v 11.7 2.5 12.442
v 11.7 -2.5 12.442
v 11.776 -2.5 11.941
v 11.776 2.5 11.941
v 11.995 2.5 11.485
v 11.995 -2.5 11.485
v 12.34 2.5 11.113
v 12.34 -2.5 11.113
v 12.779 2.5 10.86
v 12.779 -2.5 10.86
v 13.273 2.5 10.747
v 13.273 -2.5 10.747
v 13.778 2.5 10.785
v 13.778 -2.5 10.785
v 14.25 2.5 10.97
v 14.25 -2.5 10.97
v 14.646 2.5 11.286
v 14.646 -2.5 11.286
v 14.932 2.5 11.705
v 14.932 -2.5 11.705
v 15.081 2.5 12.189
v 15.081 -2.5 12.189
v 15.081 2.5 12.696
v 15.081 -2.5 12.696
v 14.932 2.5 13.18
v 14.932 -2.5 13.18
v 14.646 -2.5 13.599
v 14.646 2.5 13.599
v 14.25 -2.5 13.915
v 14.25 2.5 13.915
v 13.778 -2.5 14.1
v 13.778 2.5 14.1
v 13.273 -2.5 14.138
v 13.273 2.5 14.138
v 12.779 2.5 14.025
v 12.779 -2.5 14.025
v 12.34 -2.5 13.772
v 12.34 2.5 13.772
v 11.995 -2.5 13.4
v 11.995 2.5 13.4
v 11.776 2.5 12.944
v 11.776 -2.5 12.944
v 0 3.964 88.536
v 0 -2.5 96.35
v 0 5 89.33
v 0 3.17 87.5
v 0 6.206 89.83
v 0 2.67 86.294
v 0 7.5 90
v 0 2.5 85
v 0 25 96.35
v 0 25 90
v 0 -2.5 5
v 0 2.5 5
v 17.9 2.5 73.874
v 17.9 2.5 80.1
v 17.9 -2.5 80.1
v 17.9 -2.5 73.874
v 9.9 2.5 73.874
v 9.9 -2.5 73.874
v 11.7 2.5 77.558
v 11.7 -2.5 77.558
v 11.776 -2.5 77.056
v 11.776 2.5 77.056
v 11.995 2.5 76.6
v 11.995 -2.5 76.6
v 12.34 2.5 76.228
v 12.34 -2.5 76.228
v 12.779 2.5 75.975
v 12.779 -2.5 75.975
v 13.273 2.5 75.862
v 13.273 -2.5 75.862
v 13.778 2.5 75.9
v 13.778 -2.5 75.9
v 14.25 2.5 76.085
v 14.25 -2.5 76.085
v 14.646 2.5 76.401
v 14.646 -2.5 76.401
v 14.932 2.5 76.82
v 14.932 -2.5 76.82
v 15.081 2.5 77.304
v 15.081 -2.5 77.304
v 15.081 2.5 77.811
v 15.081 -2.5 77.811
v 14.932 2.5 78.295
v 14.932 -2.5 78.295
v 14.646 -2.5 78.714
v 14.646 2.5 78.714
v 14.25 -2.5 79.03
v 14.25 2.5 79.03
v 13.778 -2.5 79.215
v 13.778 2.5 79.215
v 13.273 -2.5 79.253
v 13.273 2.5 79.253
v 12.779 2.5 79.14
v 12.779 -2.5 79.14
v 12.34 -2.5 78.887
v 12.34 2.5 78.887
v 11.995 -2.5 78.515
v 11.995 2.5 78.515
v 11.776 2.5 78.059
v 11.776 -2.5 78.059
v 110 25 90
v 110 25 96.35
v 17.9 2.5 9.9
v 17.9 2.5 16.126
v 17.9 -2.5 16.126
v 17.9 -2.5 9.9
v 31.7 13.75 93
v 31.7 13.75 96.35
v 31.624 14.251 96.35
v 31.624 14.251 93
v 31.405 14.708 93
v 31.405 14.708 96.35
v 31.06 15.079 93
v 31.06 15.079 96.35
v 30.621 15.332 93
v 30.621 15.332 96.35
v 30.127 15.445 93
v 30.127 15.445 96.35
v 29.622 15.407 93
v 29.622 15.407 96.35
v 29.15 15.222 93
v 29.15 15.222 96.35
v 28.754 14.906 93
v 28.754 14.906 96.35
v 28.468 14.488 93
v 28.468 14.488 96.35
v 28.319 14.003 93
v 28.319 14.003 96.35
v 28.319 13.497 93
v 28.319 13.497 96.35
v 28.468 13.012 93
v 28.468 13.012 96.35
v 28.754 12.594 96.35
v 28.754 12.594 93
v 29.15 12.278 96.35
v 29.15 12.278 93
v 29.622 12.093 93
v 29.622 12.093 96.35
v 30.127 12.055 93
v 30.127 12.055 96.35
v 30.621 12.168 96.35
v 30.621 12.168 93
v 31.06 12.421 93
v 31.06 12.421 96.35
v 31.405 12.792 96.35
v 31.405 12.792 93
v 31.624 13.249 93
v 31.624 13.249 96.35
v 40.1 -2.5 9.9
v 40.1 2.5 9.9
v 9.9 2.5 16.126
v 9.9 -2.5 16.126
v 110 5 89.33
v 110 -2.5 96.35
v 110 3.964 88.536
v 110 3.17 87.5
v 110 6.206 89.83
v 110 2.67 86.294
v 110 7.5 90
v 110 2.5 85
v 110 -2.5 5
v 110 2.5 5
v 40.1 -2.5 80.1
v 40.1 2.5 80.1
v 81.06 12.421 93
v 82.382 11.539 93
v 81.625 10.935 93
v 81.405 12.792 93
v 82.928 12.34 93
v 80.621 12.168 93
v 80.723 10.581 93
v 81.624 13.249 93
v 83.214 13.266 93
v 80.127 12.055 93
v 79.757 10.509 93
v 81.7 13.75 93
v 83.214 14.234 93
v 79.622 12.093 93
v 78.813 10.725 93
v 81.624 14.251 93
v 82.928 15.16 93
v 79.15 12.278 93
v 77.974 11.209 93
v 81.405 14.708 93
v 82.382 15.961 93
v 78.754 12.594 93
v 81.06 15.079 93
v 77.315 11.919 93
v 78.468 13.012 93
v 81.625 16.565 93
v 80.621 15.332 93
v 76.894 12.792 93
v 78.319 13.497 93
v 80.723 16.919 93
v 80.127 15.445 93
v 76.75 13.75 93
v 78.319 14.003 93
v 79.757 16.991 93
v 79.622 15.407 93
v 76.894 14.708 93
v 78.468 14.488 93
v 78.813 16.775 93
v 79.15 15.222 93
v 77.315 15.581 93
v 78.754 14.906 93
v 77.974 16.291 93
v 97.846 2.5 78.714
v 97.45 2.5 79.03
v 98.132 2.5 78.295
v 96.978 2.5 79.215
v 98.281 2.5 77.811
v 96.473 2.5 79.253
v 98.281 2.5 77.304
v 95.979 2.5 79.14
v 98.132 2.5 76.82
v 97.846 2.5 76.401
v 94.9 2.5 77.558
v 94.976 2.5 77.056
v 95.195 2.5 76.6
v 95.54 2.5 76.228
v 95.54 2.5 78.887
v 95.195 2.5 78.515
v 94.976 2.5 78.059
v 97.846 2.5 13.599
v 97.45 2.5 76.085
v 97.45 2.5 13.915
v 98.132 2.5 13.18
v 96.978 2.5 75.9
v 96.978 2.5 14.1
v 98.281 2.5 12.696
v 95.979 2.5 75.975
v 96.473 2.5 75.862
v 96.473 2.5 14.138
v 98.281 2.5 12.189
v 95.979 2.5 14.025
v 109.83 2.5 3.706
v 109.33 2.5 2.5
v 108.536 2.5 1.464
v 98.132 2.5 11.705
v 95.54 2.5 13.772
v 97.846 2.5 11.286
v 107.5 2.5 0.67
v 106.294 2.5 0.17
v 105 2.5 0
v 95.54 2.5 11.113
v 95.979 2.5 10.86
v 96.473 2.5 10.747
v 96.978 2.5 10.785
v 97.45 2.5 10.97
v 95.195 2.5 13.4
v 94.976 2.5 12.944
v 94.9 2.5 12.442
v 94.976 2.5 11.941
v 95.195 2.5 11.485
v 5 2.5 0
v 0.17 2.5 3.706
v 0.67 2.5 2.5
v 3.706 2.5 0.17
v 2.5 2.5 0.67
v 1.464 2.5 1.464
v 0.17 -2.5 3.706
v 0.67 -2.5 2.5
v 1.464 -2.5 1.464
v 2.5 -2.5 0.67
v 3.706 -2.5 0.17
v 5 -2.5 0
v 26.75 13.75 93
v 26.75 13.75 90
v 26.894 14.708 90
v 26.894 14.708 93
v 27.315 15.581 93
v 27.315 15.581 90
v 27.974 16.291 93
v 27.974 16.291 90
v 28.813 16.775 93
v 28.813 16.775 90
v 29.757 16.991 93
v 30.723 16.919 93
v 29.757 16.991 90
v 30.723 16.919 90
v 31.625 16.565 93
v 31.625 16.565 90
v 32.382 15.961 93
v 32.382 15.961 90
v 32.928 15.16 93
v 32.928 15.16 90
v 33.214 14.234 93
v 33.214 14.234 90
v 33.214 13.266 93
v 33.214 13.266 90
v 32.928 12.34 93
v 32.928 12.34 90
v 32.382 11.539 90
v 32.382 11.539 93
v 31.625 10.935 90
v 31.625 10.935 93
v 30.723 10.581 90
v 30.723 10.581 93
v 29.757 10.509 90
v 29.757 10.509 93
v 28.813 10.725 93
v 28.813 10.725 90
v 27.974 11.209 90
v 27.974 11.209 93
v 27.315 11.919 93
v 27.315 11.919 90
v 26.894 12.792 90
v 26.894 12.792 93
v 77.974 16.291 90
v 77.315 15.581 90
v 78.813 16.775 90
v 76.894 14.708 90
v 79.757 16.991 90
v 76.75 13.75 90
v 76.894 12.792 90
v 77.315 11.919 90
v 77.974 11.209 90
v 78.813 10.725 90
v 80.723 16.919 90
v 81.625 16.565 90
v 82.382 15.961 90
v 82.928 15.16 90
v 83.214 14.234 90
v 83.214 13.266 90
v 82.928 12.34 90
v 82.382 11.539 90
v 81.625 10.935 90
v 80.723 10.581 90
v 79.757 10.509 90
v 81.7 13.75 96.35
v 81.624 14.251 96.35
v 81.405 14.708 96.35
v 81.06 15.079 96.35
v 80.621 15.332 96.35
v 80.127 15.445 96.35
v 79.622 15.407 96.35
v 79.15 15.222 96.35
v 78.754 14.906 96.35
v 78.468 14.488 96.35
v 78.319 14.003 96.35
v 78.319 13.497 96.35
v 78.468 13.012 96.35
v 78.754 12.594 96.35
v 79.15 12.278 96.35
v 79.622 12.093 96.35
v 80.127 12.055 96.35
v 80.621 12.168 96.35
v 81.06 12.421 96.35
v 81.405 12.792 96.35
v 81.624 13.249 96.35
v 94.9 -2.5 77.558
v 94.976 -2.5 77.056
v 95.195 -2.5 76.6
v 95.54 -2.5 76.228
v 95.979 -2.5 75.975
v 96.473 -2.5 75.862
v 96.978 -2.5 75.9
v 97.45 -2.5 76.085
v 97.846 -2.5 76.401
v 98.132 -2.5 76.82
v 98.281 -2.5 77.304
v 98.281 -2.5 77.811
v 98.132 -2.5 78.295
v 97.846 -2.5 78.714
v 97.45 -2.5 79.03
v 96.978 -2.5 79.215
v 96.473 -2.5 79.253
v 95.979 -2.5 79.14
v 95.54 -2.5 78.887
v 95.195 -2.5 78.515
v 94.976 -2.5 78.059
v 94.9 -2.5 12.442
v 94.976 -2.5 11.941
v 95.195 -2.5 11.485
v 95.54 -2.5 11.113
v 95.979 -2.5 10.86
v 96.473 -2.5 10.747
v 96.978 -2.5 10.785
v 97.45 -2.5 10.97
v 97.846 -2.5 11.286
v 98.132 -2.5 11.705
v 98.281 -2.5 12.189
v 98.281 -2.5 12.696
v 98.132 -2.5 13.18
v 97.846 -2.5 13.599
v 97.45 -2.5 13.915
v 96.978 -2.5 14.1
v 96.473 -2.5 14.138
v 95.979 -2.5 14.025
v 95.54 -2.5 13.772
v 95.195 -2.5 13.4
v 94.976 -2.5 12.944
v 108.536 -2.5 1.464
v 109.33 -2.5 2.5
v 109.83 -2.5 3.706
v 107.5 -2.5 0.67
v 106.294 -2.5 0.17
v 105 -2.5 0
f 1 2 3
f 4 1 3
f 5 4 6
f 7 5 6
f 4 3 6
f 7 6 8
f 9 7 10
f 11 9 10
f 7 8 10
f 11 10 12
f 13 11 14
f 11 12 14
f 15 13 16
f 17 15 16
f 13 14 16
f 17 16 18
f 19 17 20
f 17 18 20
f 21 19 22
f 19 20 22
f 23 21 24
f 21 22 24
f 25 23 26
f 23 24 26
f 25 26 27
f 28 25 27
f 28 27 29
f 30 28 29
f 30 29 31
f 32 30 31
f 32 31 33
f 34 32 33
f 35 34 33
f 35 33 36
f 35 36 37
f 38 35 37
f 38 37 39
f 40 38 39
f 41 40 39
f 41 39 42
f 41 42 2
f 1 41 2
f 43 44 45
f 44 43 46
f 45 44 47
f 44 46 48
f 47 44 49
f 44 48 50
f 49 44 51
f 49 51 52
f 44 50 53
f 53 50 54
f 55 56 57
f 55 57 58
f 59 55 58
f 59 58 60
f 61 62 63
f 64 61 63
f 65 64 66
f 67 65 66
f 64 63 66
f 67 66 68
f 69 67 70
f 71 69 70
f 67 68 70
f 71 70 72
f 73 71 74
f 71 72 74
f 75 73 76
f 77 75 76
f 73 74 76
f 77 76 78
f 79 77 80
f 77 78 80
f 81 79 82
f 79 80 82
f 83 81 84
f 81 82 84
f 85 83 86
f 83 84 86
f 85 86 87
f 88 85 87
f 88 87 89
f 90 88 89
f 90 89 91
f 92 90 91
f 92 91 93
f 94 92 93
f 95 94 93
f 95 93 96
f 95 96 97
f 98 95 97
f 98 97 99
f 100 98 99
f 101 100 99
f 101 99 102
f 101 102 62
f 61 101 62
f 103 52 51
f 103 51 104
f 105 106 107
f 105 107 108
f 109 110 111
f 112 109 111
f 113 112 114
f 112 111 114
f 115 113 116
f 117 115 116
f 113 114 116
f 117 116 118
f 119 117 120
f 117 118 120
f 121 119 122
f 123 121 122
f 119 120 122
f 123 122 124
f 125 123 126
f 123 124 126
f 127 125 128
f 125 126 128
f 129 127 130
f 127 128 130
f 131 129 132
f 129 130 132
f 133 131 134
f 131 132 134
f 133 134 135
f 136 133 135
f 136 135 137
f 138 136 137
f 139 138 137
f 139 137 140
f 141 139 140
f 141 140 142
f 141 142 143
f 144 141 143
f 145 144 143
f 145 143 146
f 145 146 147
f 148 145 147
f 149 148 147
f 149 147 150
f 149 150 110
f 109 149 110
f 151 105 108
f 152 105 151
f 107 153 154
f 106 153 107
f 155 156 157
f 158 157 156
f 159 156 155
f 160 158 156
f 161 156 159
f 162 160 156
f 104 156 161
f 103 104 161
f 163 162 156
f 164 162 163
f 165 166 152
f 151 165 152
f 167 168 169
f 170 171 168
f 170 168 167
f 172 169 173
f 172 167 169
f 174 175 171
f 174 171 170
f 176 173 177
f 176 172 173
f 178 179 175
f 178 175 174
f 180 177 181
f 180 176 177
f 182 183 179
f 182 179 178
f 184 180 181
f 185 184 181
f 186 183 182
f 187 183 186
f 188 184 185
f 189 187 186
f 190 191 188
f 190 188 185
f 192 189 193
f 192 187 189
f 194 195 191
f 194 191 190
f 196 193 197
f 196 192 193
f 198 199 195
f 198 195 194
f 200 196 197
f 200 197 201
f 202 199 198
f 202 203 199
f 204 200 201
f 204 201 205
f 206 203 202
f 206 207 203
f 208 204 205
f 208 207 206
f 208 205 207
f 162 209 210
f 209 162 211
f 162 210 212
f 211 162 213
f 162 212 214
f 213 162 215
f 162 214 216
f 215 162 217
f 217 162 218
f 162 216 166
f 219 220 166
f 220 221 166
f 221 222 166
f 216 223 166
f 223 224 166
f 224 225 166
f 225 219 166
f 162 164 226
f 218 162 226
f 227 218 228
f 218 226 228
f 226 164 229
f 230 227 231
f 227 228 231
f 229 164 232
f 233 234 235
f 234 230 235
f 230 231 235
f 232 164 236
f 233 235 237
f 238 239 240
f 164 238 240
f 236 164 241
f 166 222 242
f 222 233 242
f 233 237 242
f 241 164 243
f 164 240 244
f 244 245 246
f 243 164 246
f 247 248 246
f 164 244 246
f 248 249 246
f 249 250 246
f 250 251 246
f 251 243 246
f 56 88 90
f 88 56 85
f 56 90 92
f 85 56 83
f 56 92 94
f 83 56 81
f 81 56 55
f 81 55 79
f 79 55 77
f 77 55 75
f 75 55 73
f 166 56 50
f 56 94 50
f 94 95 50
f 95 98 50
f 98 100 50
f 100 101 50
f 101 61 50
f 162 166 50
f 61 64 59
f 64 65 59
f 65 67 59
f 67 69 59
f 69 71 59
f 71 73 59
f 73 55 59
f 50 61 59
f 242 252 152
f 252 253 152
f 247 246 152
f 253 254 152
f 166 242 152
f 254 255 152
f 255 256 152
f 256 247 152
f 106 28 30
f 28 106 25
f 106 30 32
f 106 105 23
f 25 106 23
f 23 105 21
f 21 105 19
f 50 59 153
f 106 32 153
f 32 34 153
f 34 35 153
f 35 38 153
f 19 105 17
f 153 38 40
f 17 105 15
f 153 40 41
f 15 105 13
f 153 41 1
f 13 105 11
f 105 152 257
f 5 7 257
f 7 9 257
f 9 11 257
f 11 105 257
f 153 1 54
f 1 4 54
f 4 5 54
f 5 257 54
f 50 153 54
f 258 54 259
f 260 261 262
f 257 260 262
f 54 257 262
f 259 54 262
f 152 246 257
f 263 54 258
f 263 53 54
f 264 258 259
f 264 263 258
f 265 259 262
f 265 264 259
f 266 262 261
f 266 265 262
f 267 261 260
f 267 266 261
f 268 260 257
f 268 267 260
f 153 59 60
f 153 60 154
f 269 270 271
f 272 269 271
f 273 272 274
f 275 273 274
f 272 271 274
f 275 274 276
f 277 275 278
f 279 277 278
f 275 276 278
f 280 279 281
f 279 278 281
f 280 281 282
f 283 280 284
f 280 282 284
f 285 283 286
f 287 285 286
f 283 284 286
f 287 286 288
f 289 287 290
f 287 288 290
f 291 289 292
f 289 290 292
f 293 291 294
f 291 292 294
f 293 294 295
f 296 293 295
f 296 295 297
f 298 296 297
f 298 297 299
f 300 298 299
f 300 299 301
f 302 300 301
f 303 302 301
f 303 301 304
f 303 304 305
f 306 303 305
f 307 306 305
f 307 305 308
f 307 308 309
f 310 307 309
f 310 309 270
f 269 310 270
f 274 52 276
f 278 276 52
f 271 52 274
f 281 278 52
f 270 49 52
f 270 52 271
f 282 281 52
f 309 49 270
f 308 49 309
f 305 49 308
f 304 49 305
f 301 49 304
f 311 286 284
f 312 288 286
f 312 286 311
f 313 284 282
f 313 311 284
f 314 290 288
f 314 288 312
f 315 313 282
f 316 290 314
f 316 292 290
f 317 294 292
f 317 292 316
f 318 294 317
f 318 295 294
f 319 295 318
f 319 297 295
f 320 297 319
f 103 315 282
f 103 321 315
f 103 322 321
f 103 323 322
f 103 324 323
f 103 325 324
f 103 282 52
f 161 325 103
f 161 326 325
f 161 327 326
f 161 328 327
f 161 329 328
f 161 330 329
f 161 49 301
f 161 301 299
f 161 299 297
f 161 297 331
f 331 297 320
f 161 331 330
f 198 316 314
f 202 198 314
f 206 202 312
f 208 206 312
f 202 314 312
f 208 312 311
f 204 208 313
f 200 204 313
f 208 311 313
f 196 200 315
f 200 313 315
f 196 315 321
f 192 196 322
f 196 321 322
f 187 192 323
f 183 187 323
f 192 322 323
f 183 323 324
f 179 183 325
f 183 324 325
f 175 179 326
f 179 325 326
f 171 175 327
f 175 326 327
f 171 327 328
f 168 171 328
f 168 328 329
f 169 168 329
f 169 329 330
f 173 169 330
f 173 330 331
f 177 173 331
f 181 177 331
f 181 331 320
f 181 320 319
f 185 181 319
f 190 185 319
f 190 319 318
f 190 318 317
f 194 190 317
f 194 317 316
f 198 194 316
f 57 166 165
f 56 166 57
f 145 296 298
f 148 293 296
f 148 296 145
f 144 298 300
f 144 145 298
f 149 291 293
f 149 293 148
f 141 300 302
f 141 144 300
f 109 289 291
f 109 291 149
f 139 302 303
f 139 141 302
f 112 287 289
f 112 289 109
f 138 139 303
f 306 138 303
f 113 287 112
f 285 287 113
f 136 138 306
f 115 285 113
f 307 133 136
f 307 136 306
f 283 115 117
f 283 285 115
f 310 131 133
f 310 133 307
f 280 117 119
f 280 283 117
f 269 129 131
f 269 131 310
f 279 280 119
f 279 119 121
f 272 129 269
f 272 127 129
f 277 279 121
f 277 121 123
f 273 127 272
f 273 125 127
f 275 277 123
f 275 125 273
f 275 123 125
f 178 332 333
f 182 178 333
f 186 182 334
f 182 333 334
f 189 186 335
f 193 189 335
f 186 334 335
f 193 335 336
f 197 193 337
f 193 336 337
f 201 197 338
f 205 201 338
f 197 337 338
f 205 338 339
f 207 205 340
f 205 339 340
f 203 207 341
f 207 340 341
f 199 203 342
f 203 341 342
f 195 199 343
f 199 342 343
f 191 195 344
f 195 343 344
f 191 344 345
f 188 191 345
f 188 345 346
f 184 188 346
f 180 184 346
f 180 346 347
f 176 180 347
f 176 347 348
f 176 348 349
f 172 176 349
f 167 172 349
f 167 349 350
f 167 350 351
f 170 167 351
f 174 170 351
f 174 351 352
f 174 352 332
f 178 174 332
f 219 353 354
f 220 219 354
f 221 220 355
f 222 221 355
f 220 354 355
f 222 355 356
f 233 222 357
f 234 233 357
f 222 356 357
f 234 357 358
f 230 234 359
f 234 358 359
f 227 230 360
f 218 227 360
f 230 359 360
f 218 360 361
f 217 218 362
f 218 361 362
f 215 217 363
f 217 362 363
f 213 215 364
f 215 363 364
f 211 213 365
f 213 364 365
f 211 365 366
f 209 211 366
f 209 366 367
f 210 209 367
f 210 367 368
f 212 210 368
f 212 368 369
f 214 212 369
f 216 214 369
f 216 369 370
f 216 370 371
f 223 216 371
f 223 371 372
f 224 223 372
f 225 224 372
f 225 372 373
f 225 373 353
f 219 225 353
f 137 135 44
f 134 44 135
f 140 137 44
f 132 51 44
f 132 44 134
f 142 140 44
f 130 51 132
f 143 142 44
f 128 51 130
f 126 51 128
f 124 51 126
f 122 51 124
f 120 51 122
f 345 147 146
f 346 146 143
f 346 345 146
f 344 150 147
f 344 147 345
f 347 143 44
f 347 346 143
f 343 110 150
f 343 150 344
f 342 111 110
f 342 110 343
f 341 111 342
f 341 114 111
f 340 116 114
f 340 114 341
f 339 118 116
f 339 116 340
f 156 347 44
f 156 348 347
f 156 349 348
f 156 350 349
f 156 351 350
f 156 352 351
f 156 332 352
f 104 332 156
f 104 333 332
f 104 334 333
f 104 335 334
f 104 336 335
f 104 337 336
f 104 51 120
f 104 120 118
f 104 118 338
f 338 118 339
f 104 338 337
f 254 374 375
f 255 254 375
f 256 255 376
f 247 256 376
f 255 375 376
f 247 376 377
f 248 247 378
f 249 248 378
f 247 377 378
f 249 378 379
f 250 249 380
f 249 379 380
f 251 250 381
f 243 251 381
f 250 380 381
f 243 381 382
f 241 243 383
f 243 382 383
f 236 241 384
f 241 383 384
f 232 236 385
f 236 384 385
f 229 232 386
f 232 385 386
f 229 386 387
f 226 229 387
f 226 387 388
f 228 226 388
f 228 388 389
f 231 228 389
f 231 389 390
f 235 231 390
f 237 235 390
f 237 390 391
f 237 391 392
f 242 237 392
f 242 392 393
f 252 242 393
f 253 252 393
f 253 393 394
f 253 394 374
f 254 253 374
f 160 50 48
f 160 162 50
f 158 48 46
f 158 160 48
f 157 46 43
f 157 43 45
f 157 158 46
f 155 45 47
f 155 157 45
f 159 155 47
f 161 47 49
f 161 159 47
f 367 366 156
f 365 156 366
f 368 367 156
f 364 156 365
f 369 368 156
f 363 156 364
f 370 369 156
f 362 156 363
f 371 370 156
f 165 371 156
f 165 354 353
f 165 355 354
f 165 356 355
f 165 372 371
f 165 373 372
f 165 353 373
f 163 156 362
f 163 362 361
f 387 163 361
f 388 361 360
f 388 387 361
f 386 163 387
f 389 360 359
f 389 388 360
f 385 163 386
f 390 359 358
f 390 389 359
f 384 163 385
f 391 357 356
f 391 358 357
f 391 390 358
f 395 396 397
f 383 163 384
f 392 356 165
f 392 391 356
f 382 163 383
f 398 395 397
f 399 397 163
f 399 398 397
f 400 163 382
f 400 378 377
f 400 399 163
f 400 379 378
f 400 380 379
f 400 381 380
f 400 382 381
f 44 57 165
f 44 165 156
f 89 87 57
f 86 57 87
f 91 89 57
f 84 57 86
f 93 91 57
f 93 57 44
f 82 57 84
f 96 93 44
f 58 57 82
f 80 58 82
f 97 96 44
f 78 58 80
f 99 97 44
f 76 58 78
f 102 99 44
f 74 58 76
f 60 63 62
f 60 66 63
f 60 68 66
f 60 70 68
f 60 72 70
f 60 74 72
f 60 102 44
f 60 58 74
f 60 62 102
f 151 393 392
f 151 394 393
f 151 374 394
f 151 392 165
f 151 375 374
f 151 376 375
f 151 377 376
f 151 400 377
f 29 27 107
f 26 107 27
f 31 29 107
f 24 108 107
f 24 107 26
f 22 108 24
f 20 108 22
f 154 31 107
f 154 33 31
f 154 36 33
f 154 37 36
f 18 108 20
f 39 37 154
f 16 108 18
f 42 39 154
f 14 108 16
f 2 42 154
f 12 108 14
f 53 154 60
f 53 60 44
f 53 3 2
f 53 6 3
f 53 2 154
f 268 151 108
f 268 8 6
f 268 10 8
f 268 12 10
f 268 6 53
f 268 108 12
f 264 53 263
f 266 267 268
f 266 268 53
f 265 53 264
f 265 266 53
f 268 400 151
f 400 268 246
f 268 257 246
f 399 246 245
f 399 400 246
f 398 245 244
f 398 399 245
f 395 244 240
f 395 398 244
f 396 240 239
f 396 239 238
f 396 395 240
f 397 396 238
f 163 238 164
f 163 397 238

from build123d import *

# Parameters (mm, degrees)
SKETCH1_W                      = 110
SKETCH1_H                      = 90
BOSS_EXTRUDE1_DEPTH            = 2.5
M3_CLEARANCE_HOLE1_D           = 3.4
M3_CLEARANCE_HOLE1_DEPTH       = 5
SKETCH5_W                      = 110
SKETCH5_H                      = 6.35
BOSS_EXTRUDE2_DEPTH            = 25
BOSS_EXTRUDE2_DEPTH_BACK       = 2.5
CBORE_FOR_M3_SHCS1_D           = 3.4
CBORE_FOR_M3_SHCS1_DEPTH       = 6.35
CBORE_FOR_M3_SHCS1_CBORE_D     = 6.5
CBORE_FOR_M3_SHCS1_CBORE_DEPTH = 3
CUT_EXTRUDE1_DEPTH             = 6
BOSS_EXTRUDE4_DEPTH            = 5
FILLET1_R                      = 5
FILLET2_R                      = 5


with BuildPart() as part:
    # Sketch1 → Boss-Extrude1 (new body, symmetric)
    with BuildSketch(Plane(origin=(0, 0, 0), x_dir=(1, 0, 0), z_dir=(0, 1, 0))):
        with Locations((55, -45)):
            Rectangle(SKETCH1_W, SKETCH1_H)
    extrude(amount=BOSS_EXTRUDE1_DEPTH, both=True)

    # M3 Clearance Hole1
    with Locations(Plane(origin=(0, 2.5, 0), x_dir=(1, 0, 0), z_dir=(0, 1, 0))):
        with Locations((13.4, -77.55755), (96.6, -12.44245), (96.6, -77.55755), (13.4, -12.44245)):
            Hole(M3_CLEARANCE_HOLE1_D / 2, depth=M3_CLEARANCE_HOLE1_DEPTH)

    # Sketch5 → Boss-Extrude2 (add, two sides)
    with BuildSketch(Plane(origin=(0, 0, 0), x_dir=(1, 0, 0), z_dir=(0, 1, 0))) as boss_extrude2_sk:
        with Locations((55, -93.175)):
            Rectangle(SKETCH5_W, SKETCH5_H)
    extrude(amount=BOSS_EXTRUDE2_DEPTH)
    extrude(boss_extrude2_sk.sketch, amount=-BOSS_EXTRUDE2_DEPTH_BACK)

    # CBORE for M3 SHCS1
    with Locations(Plane(origin=(0, 0, 90), x_dir=(-1, 0, 0), z_dir=(0, 0, -1))):
        with Locations((-80, 13.75), (-30, 13.75)):
            CounterBoreHole(CBORE_FOR_M3_SHCS1_D / 2, CBORE_FOR_M3_SHCS1_CBORE_D / 2, CBORE_FOR_M3_SHCS1_CBORE_DEPTH, depth=CBORE_FOR_M3_SHCS1_DEPTH)

    # Sketch8 → Cut-Extrude1 (cut, through all)
    with BuildSketch(Plane(origin=(0, 2.5, 0), x_dir=(1, 0, 0), z_dir=(0, 1, 0))):
        Polygon((17.9, -9.9), (92.1, -9.9), (92.1, -16.12616408), (100.1, -16.12616408), (100.1, -73.87383592), (92.1, -73.87383592), (92.1, -80.1), (17.9, -80.1), (17.9, -73.87383592), (9.9, -73.87383592), (9.9, -16.12616408), (17.9, -16.12616408), align=None)
    extrude(amount=-CUT_EXTRUDE1_DEPTH, mode=Mode.SUBTRACT)

    # Sketch10 → Boss-Extrude4 (add, through all)
    with BuildSketch(Plane(origin=(0, 2.5, 0), x_dir=(1, 0, 0), z_dir=(0, 1, 0))):
        Polygon((40.1, -9.9), (92.1, -9.9), (92.1, -16.12616408), (100.1, -16.12616408), (100.1, -73.87383592), (92.1, -73.87383592), (92.1, -80.1), (40.1, -80.1), align=None)
    extrude(amount=-BOSS_EXTRUDE4_DEPTH)

    # Fillet1
    fillet1_edges = [part.edges().sort_by_distance(p)[0] for p in [
        (0, 0, 0),
        (110, 0, 0),
    ]]
    fillet(fillet1_edges, radius=FILLET1_R)

    # Fillet2
    fillet2_edges = [part.edges().sort_by_distance(p)[0] for p in [
        (55, 2.5, 90),
    ]]
    fillet(fillet2_edges, radius=FILLET2_R)


solid = part.part
